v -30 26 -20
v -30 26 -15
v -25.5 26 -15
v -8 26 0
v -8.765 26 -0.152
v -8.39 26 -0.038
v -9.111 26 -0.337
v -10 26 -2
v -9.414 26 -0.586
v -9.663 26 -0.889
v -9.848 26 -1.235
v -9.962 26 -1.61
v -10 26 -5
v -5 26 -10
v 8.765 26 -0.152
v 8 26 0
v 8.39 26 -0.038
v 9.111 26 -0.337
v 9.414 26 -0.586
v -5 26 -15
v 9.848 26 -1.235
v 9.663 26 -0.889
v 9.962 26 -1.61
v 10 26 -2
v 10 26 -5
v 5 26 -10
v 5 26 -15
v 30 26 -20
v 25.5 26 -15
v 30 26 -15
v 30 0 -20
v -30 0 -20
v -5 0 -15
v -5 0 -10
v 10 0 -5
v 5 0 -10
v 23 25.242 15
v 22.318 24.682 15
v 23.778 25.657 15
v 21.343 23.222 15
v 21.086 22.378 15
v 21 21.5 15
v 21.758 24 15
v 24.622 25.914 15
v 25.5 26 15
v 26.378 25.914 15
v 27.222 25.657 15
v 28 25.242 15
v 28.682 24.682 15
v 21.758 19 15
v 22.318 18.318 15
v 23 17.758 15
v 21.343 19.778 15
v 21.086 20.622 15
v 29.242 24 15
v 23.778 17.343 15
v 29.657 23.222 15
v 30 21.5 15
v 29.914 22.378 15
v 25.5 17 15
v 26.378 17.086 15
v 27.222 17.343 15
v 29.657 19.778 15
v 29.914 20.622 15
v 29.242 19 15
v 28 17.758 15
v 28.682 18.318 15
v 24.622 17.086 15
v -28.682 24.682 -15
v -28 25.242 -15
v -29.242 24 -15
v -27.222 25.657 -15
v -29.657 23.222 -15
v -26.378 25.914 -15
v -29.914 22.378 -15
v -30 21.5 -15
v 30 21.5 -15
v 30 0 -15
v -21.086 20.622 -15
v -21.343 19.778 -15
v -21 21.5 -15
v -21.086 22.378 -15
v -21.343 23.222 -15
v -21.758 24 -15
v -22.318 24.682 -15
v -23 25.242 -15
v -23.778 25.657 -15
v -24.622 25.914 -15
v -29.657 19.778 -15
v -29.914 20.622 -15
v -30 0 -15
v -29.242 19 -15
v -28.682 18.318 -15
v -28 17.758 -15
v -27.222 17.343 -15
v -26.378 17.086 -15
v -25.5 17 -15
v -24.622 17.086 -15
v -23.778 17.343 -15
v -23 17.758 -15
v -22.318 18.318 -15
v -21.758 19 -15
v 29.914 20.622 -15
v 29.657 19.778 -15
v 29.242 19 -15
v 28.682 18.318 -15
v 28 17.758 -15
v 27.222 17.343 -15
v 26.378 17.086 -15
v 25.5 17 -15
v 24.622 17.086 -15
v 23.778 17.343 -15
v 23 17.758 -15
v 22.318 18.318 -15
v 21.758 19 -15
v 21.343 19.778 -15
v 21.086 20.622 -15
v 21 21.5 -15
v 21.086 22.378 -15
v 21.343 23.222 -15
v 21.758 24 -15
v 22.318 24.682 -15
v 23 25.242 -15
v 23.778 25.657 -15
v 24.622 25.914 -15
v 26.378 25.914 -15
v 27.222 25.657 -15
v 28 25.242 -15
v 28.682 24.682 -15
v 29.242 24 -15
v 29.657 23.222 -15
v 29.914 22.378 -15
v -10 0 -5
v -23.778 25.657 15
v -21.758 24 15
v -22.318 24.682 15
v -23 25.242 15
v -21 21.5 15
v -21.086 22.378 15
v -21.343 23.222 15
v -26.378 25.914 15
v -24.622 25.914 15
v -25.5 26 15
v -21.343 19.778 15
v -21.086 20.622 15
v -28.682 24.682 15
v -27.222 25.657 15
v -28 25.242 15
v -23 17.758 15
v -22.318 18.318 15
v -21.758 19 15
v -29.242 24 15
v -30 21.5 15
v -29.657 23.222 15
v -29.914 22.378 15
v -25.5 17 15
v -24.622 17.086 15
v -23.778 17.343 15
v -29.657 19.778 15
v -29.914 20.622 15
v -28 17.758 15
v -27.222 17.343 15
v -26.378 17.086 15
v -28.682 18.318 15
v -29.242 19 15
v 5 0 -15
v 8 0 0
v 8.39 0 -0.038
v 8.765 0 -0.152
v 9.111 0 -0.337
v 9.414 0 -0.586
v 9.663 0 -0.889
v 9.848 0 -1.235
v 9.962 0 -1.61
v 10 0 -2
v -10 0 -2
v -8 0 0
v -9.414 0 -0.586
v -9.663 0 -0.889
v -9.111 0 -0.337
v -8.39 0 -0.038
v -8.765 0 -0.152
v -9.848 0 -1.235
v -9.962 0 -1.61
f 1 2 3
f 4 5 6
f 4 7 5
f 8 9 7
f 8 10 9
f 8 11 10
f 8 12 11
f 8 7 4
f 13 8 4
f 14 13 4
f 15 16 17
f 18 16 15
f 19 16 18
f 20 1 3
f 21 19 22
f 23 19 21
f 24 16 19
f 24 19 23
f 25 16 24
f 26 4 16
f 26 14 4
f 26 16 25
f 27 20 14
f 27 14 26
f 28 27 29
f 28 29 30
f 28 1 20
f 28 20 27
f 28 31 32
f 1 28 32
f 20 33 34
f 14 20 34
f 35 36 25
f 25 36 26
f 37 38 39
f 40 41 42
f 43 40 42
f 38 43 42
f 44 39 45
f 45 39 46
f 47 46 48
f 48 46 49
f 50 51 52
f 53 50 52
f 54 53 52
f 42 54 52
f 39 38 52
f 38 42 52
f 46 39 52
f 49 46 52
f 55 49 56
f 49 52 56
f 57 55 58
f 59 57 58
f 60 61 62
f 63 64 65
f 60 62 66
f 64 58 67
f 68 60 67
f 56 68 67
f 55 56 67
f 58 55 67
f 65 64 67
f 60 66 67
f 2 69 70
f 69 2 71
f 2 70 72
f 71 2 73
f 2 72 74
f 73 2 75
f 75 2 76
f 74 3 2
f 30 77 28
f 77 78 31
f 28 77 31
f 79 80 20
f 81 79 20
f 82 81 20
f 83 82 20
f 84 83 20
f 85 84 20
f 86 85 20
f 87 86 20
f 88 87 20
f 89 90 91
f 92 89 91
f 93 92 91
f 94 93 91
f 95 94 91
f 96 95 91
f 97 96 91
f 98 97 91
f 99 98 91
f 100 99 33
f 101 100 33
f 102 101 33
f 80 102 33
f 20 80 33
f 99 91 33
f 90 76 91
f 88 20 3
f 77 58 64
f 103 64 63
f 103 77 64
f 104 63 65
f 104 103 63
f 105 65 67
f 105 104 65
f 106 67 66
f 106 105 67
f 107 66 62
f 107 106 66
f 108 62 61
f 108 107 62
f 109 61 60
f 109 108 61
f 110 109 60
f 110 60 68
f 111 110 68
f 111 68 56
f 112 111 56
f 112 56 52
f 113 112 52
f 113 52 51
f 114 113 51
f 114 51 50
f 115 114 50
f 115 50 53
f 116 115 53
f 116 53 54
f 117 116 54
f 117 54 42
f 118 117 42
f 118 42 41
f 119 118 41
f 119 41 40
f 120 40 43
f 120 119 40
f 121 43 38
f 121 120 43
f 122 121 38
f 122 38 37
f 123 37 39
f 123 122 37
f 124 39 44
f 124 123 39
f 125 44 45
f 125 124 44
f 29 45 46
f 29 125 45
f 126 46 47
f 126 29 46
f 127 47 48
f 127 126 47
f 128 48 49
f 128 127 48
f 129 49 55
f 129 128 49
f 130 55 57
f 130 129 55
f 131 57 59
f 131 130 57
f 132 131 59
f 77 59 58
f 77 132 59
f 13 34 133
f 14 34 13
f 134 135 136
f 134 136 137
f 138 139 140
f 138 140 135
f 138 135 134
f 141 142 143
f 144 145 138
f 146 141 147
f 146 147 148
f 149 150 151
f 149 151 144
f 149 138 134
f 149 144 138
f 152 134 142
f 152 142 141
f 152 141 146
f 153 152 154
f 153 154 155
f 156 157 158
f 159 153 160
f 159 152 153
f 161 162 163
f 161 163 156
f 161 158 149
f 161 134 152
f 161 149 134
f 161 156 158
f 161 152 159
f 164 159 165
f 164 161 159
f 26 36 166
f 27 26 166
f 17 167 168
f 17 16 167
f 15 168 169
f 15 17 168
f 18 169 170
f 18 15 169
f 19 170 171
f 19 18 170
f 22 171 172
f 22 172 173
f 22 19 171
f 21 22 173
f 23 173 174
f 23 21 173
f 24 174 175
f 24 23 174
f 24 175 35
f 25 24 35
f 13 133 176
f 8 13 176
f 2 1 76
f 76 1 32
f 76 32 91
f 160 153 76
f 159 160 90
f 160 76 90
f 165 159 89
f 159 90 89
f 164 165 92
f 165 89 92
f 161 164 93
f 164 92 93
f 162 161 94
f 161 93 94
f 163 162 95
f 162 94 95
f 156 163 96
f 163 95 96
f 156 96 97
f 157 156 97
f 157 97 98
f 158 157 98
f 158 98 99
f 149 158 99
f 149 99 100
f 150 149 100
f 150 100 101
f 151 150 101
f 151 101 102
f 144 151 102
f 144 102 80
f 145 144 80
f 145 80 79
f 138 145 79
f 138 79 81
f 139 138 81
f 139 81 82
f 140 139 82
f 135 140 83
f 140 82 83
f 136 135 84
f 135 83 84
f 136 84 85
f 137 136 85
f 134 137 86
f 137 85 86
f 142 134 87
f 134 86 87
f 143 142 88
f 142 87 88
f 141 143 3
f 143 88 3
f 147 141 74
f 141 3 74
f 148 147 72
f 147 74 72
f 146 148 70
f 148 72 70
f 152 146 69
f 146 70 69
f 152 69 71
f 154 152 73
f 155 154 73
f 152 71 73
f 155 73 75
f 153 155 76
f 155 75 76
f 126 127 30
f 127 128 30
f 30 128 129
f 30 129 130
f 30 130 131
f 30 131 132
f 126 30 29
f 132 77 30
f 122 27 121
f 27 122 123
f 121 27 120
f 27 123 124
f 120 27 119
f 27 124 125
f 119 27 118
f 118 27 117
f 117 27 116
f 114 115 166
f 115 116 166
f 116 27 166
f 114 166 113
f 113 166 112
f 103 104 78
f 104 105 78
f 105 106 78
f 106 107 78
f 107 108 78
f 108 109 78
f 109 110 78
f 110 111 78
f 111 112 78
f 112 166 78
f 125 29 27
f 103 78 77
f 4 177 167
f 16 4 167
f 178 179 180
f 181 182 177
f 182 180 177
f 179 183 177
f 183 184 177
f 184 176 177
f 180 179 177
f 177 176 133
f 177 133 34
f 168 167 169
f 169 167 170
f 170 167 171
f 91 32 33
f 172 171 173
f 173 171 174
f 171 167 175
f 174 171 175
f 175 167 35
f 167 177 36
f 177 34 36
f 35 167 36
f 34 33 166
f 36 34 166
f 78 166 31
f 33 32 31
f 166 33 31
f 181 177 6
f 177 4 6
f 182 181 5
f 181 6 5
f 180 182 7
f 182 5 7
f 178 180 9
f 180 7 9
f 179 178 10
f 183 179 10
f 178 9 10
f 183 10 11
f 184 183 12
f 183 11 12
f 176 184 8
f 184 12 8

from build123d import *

# Parameters (mm, degrees)
BOSS_EXTRUDE1_DEPTH = 26
SKETCH2_R           = 4.5
BOSS_EXTRUDE2_DEPTH = 30
FILLET1_R           = 2
CHAMFER1_SIZE       = 5


with BuildPart() as part:
    # Sketch1 → Boss-Extrude1 (new body)
    with BuildSketch(Plane(origin=(0, 0, 0), x_dir=(1, 0, 0), z_dir=(0, 1, 0))):
        Polygon((-10, 0), (0, 0), (0, 20), (-30, 20), (-30, 15), (-5, 15), (-5, 5), (-10, 5), align=None)
        Polygon((0, 0), (10, 0), (10, 5), (5, 5), (5, 15), (30, 15), (30, 20), (0, 20), align=None)
    extrude(amount=BOSS_EXTRUDE1_DEPTH)

    # Sketch2 → Boss-Extrude2 (add)
    with BuildSketch(Plane.XY.offset(-15)):
        with Locations(Location((-25.5, 21.5, 0), (0, 0, 180))):
            Circle(SKETCH2_R)
    boss_extrude2 = extrude(amount=BOSS_EXTRUDE2_DEPTH)

    # Mirror1: Boss-Extrude2 across plane
    add(boss_extrude2.mirror(Plane(origin=(0, 0, 0), x_dir=(0, 0, 1), z_dir=(1, 0, 0))))

    # Fillet1
    fillet1_edges = [part.edges().sort_by_distance(p)[0] for p in [
        (-10, 13, 0),
        (10, 13, 0),
    ]]
    fillet(fillet1_edges, radius=FILLET1_R)

    # Chamfer1
    chamfer1_edges = [part.edges().sort_by_distance(p)[0] for p in [
        (5, 13, -5),
        (-5, 13, -5),
    ]]
    chamfer(chamfer1_edges, length=CHAMFER1_SIZE - 0.0001)  # a hair under: the kernel refuses the full size


solid = part.part
